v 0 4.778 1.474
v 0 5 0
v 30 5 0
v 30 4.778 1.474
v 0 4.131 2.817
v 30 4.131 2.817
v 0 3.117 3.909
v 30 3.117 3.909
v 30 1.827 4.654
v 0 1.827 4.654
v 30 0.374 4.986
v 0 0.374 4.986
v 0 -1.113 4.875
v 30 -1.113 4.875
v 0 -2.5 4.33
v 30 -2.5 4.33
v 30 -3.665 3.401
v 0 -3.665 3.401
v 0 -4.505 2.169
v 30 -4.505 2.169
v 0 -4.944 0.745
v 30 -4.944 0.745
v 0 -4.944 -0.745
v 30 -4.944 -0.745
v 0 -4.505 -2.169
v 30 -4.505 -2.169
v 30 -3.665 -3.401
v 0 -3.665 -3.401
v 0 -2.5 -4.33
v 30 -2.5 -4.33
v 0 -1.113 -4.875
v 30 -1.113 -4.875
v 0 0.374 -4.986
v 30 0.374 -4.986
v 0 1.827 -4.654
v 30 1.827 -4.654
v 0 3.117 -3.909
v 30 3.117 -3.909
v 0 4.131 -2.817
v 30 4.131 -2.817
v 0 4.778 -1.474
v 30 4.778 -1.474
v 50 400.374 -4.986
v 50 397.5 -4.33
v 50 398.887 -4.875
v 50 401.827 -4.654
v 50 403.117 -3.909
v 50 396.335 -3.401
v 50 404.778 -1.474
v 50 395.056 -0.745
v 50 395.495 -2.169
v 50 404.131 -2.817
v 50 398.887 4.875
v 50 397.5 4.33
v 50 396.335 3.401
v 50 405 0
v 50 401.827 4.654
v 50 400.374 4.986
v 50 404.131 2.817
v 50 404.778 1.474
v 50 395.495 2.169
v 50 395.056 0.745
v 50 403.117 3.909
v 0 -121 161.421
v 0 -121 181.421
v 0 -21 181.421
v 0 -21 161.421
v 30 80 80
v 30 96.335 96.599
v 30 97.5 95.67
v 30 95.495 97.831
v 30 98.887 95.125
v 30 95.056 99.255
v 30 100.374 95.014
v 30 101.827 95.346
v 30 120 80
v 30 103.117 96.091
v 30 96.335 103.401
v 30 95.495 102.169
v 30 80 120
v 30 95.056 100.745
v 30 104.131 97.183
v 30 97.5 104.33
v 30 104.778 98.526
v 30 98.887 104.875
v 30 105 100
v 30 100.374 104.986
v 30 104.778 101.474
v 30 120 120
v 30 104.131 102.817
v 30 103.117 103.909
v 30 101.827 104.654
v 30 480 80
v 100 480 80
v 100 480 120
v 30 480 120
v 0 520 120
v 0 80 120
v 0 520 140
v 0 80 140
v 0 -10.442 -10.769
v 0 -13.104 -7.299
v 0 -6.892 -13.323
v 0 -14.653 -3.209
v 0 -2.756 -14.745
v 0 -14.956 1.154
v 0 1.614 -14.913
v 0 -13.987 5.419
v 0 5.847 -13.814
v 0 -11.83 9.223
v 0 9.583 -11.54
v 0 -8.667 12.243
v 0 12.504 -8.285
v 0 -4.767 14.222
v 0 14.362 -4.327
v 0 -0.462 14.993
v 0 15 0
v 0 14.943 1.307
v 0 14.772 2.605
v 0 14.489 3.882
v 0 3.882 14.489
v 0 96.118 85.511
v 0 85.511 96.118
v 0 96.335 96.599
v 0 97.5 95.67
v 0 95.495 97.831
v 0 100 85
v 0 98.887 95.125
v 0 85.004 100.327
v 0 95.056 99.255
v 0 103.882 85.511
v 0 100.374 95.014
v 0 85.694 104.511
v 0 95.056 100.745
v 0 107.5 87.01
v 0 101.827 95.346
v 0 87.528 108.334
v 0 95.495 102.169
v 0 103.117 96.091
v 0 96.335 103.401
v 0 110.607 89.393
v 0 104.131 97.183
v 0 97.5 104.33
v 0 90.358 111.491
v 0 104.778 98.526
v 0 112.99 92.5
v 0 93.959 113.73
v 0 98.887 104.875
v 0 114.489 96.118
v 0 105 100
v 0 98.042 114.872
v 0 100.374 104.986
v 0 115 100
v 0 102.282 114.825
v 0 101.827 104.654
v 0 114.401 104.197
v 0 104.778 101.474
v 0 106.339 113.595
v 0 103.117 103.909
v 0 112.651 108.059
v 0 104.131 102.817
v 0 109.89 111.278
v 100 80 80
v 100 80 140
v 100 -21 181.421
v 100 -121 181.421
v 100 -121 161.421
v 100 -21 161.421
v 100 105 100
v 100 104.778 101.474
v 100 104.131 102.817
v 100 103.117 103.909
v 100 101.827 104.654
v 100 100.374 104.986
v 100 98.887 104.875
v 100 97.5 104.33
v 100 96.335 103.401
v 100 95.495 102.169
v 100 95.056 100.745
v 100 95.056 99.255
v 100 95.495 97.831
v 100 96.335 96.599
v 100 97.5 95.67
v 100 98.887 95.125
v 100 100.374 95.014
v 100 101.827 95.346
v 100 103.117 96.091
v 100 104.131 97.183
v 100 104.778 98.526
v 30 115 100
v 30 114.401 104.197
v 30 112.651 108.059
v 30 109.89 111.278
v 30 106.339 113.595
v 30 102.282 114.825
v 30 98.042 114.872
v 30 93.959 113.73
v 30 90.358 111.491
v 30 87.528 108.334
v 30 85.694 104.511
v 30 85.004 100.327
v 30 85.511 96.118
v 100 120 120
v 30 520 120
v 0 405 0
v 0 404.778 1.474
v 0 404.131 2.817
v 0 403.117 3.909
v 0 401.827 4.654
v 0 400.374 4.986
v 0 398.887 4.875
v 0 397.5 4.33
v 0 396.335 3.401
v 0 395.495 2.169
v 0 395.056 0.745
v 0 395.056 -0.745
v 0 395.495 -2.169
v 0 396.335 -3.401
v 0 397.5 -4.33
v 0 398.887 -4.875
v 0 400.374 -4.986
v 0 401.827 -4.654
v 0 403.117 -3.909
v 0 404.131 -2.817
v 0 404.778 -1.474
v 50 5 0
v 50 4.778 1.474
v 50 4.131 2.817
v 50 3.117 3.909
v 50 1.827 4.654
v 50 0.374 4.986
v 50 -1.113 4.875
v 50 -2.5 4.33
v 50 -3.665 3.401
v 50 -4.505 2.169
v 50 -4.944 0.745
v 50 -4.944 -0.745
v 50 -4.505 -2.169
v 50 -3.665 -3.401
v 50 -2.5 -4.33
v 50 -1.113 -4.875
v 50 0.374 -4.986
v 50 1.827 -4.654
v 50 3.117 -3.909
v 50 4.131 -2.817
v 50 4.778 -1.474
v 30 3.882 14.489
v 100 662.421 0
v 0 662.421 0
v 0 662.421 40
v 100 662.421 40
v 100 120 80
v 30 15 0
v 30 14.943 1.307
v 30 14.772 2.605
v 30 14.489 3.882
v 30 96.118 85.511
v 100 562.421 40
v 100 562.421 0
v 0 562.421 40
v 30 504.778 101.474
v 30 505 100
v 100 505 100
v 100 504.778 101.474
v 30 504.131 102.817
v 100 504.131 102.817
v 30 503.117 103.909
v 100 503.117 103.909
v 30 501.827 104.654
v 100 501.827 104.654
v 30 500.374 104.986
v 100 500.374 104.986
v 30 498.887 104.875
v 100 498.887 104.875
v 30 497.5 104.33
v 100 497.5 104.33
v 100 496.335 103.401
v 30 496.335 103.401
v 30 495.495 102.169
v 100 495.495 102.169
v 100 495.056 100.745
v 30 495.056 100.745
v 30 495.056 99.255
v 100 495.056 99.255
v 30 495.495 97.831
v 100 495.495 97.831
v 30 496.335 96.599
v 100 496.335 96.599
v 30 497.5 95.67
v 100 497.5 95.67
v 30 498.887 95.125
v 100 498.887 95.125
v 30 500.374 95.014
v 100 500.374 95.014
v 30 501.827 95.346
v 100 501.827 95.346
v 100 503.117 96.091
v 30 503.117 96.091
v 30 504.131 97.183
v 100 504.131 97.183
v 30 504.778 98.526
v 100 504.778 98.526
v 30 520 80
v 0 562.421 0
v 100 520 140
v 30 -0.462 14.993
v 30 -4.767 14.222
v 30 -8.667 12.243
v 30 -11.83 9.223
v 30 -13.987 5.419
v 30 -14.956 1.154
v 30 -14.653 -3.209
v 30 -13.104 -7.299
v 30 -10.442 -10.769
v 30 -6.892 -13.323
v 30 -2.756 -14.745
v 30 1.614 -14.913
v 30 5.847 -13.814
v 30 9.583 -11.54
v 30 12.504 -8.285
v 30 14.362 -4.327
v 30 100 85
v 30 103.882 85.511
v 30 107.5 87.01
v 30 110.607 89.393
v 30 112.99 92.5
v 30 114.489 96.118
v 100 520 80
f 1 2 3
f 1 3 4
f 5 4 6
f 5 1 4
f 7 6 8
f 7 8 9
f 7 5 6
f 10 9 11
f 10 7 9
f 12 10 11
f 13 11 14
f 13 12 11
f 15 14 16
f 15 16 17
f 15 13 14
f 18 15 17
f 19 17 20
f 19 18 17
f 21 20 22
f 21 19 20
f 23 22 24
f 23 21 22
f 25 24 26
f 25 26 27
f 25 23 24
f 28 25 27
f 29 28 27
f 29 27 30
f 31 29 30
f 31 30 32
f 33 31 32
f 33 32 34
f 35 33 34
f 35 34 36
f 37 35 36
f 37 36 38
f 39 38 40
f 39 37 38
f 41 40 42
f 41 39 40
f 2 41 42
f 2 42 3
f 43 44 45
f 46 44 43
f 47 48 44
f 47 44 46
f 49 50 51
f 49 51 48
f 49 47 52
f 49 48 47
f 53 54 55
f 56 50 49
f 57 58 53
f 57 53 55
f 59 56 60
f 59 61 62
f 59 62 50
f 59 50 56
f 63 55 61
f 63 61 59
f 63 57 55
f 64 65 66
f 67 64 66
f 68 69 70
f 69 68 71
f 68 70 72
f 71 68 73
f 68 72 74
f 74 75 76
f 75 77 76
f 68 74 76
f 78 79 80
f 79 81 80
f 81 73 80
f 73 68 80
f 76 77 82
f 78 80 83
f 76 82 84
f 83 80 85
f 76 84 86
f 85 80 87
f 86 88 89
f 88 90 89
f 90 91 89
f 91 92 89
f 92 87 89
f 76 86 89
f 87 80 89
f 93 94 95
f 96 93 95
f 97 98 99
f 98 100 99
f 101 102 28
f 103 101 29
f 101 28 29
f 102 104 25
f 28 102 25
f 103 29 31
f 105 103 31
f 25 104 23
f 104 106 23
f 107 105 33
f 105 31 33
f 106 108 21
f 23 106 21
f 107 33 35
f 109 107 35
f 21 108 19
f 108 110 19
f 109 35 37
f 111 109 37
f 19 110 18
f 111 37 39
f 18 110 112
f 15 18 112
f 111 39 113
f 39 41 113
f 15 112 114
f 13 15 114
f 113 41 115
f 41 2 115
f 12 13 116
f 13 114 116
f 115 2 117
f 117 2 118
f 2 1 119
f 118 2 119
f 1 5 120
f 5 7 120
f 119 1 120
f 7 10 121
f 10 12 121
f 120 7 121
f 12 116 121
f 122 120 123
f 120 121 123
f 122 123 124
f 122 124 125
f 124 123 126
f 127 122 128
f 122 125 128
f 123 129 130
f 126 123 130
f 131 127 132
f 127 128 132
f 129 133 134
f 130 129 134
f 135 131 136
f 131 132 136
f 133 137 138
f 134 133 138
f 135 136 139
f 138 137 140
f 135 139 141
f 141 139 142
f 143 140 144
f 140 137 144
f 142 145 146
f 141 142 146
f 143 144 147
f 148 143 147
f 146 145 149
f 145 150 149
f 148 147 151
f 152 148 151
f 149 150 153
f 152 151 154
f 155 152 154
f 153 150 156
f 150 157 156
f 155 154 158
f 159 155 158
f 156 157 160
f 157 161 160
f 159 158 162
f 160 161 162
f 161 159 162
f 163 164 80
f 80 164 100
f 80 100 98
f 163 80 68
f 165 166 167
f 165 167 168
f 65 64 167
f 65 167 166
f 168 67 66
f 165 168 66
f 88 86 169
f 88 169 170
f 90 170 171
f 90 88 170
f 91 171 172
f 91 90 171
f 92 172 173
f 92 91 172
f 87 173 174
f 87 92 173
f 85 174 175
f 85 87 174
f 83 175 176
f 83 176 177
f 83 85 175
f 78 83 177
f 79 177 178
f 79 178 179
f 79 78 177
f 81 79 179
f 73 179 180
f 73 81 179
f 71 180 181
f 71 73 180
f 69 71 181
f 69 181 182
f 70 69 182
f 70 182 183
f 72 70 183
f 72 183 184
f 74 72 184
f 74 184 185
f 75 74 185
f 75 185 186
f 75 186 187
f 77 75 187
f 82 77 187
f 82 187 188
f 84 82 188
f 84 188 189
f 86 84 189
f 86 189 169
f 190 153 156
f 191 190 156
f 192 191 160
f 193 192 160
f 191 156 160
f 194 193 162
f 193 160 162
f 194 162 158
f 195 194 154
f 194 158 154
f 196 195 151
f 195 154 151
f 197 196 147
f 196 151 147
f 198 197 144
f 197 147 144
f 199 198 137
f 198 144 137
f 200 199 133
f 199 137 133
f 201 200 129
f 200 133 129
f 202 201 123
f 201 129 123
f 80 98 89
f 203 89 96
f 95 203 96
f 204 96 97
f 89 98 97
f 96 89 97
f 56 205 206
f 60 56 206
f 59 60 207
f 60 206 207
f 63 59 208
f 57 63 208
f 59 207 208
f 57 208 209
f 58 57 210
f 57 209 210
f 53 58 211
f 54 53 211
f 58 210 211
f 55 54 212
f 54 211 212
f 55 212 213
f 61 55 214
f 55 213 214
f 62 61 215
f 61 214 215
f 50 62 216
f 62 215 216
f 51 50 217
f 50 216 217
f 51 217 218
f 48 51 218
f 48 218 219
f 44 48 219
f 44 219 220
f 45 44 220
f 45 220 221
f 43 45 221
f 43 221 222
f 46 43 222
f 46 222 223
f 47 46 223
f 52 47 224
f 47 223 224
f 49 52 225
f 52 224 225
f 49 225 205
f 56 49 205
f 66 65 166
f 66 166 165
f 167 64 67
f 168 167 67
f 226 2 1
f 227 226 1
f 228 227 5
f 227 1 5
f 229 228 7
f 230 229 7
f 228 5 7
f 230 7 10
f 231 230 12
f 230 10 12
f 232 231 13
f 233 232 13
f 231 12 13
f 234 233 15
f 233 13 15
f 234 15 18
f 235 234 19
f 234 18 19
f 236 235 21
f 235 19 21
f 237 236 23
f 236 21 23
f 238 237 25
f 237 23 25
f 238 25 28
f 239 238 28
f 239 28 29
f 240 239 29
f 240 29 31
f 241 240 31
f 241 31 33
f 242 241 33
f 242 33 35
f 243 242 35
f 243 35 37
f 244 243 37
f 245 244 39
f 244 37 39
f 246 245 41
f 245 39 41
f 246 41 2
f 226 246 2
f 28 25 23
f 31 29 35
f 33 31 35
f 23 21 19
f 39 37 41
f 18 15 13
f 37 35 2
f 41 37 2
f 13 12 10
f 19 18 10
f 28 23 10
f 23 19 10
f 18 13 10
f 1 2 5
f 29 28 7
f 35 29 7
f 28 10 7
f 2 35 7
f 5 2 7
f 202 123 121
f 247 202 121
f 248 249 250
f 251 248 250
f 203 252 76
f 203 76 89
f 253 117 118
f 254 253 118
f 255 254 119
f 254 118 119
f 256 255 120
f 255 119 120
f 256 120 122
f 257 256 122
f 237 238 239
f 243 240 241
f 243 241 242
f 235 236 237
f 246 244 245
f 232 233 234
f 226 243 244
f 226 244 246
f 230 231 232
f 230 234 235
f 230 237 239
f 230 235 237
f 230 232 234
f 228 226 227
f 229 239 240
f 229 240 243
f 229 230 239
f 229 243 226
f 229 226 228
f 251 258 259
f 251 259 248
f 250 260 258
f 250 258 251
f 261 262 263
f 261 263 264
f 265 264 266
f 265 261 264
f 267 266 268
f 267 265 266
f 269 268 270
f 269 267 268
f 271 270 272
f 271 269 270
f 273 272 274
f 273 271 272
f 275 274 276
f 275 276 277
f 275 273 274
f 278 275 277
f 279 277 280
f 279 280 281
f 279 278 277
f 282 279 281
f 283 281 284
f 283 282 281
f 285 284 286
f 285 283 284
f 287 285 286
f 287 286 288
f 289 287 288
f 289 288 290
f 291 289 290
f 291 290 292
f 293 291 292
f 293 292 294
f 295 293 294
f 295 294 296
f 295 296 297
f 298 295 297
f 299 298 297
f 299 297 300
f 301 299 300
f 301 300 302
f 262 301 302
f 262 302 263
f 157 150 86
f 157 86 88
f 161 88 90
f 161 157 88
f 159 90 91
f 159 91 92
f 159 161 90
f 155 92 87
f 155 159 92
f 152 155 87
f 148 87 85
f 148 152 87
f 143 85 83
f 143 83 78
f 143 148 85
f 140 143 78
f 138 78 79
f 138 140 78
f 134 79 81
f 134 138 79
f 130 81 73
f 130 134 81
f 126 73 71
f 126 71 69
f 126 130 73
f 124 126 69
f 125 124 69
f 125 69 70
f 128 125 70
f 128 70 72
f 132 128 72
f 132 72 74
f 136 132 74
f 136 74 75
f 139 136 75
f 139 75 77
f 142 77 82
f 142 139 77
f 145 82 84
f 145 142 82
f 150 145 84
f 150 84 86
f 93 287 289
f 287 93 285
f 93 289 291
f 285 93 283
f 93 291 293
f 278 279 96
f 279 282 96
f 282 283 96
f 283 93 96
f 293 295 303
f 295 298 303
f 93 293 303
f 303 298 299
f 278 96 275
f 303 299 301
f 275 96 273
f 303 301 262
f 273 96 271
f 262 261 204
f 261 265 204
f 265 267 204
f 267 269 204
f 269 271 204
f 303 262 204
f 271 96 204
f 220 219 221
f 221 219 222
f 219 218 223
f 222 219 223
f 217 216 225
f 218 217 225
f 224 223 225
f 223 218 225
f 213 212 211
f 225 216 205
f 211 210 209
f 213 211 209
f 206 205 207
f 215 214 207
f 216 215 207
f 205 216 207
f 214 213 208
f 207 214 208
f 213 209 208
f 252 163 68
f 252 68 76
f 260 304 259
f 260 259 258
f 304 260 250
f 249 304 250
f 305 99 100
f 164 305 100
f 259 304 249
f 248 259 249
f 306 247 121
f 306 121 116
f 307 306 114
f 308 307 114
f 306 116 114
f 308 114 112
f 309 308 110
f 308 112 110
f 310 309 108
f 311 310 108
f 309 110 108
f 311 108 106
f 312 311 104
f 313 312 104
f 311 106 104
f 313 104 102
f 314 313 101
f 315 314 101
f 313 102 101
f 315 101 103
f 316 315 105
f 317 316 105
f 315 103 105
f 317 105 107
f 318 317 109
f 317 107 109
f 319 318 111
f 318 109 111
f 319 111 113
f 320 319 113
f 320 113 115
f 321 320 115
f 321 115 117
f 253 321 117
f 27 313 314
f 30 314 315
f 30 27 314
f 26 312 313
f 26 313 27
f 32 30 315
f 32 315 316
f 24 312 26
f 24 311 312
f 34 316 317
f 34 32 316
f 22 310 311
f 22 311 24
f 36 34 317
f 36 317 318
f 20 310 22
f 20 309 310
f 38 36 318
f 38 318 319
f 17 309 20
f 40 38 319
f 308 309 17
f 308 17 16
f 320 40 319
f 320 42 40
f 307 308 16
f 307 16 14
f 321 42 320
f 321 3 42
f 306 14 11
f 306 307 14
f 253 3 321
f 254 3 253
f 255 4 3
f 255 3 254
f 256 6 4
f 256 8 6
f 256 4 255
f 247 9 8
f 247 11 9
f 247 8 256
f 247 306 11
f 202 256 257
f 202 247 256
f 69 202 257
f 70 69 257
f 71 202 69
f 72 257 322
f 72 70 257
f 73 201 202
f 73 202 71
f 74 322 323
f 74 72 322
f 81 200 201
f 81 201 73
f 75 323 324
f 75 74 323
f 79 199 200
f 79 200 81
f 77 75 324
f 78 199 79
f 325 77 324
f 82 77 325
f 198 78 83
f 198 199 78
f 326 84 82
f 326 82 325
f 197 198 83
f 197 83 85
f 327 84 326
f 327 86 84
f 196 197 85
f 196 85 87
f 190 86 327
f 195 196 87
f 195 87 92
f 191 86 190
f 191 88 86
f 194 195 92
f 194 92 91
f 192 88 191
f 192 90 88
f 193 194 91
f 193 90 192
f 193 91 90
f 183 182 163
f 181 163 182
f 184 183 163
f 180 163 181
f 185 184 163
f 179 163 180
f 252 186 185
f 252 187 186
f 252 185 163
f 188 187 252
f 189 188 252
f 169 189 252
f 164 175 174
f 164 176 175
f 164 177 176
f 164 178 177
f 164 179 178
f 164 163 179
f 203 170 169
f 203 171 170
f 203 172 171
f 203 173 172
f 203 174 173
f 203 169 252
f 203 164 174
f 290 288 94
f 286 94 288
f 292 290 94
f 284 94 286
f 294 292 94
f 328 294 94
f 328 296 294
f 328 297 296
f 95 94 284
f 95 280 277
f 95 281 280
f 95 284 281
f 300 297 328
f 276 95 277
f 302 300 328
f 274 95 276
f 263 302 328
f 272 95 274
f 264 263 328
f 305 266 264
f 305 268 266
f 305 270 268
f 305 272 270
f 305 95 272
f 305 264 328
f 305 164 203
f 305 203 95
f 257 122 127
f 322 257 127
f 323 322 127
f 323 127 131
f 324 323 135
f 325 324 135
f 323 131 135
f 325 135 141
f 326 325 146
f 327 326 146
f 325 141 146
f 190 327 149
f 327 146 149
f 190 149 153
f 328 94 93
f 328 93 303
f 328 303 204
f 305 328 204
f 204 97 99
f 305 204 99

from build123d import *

# Parameters (mm, degrees)
F0_R     = 5
F0_W     = 40
F0_H     = 40
F1_DEPTH = 100
F2_DEPTH = 30
F3_DEPTH = 30
F0_W_2   = 100
F4_DEPTH = 100
F0_H_2   = 20
F5_DEPTH = 100
F6_DEPTH = 50


with BuildPart() as f1:
    # F0 (on Right) → F1 (new body)
    with BuildSketch(Plane.YZ):
        with BuildLine():
            Line((90.6066017178, 80), (120, 80))
            Line((120, 80), (120, 120))
            Line((120, 120), (80, 120))
            Line((80, 120), (80, 90.6066017178))
            Line((80, 90.6066017178), (85.5111126057, 96.1177143235))
            ThreePointArc((85.5111126057, 96.1177143235), (98.0421071167, 114.8716729206), (115, 100))
            ThreePointArc((115, 100), (109.1314214351, 88.0996998956), (96.1177143235, 85.5111126057))
            Line((96.1177143235, 85.5111126057), (90.6066017178, 80))
        make_face()
        with BuildLine():
            Line((80, 80), (90.6066017178, 80))
            Line((90.6066017178, 80), (96.1177143235, 85.5111126057))
            ThreePointArc((96.1177143235, 85.5111126057), (89.3933982822, 89.3933982822), (85.5111126057, 96.1177143235))
            Line((85.5111126057, 96.1177143235), (80, 90.6066017178))
            Line((80, 90.6066017178), (80, 80))
        make_face()
        with BuildLine():
            ThreePointArc((85.5111126057, 96.1177143235), (89.3933982822, 89.3933982822), (96.1177143235, 85.5111126057))
            ThreePointArc((96.1177143235, 85.5111126057), (109.1314214351, 88.0996998956), (115, 100))
            ThreePointArc((115, 100), (98.0421071167, 114.8716729206), (85.5111126057, 96.1177143235))
        make_face()
        with Locations((100, 100)):
            Circle(F0_R, mode=Mode.SUBTRACT)
        Polygon((80, 120), (120, 120), (480, 120), (520, 120), (520, 140), (80, 140), align=None)
        with Locations((500, 100)):
            Rectangle(F0_W, F0_H)
        with Locations((500, 100)):
            Circle(F0_R, mode=Mode.SUBTRACT)
    extrude(amount=F1_DEPTH)

    # F0 (on Right) → F3 (cut)
    with BuildSketch(Plane.YZ):
        with BuildLine():
            Line((90.6066017178, 80), (120, 80))
            Line((120, 80), (120, 120))
            Line((120, 120), (80, 120))
            Line((80, 120), (80, 90.6066017178))
            Line((80, 90.6066017178), (85.5111126057, 96.1177143235))
            ThreePointArc((85.5111126057, 96.1177143235), (98.0421071167, 114.8716729206), (115, 100))
            ThreePointArc((115, 100), (109.1314214351, 88.0996998956), (96.1177143235, 85.5111126057))
            Line((96.1177143235, 85.5111126057), (90.6066017178, 80))
        make_face()
        with BuildLine():
            ThreePointArc((85.5111126057, 96.1177143235), (89.3933982822, 89.3933982822), (96.1177143235, 85.5111126057))
            ThreePointArc((96.1177143235, 85.5111126057), (109.1314214351, 88.0996998956), (115, 100))
            ThreePointArc((115, 100), (98.0421071167, 114.8716729206), (85.5111126057, 96.1177143235))
        make_face()
        with Locations((100, 100)):
            Circle(F0_R, mode=Mode.SUBTRACT)
        with BuildLine():
            Line((80, 80), (90.6066017178, 80))
            Line((90.6066017178, 80), (96.1177143235, 85.5111126057))
            ThreePointArc((96.1177143235, 85.5111126057), (89.3933982822, 89.3933982822), (85.5111126057, 96.1177143235))
            Line((85.5111126057, 96.1177143235), (80, 90.6066017178))
            Line((80, 90.6066017178), (80, 80))
        make_face()
        with Locations((500, 100)):
            Rectangle(F0_W, F0_H)
        with Locations((500, 100)):
            Circle(F0_R, mode=Mode.SUBTRACT)
    extrude(amount=F3_DEPTH, mode=Mode.SUBTRACT)


with BuildPart() as f2:
    # F0 (on Right) → F2 (new body)
    with BuildSketch(Plane.YZ):
        with BuildLine():
            ThreePointArc((85.5111126057, 96.1177143235), (89.3933982822, 89.3933982822), (96.1177143235, 85.5111126057))
            ThreePointArc((96.1177143235, 85.5111126057), (109.1314214351, 88.0996998956), (115, 100))
            ThreePointArc((115, 100), (98.0421071167, 114.8716729206), (85.5111126057, 96.1177143235))
        make_face()
        with Locations((100, 100)):
            Circle(F0_R, mode=Mode.SUBTRACT)
        with BuildLine():
            Line((80, 80), (90.6066017178, 80))
            Line((90.6066017178, 80), (96.1177143235, 85.5111126057))
            ThreePointArc((96.1177143235, 85.5111126057), (89.3933982822, 89.3933982822), (85.5111126057, 96.1177143235))
            Line((85.5111126057, 96.1177143235), (80, 90.6066017178))
            Line((80, 90.6066017178), (80, 80))
        make_face()
        with BuildLine():
            Line((14.4888873943, 3.8822856765), (90.6066017178, 80))
            Line((90.6066017178, 80), (80, 80))
            Line((80, 80), (80, 90.6066017178))
            Line((80, 90.6066017178), (3.8822856765, 14.4888873943))
            ThreePointArc((3.8822856765, 14.4888873943), (10.6066017178, 10.6066017178), (14.4888873943, 3.8822856765))
        make_face()
        with BuildLine():
            ThreePointArc((15, 0), (14.8716729206, 1.9578928833), (14.4888873943, 3.8822856765))
            ThreePointArc((14.4888873943, 3.8822856765), (10.6066017178, 10.6066017178), (3.8822856765, 14.4888873943))
            ThreePointArc((3.8822856765, 14.4888873943), (-11.9003001044, -9.1314214351), (15, 0))
        make_face()
        Circle(F0_R, mode=Mode.SUBTRACT)
    extrude(amount=F2_DEPTH)


with BuildPart() as f4:
    # F0 (on Right) → F4 (new body)
    with BuildSketch(Plane.YZ):
        with Locations((612.4213562373, 20)):
            Rectangle(F0_W_2, F0_H)
    extrude(amount=F4_DEPTH)


with BuildPart() as f5:
    # F0 (on Right) → F5 (new body)
    with BuildSketch(Plane.YZ):
        with Locations((-71, 171.4213562373)):
            Rectangle(F0_W_2, F0_H_2)
    extrude(amount=F5_DEPTH)


with BuildPart() as f6:
    # F0 (on Right) → F6 (new body)
    with BuildSketch(Plane.YZ):
        Circle(F0_R)
    extrude(amount=F6_DEPTH)


with BuildPart() as f6b:
    # F0 (on Right) → F6, piece 2 (new body)
    with BuildSketch(Plane.YZ):
        with Locations((400, 0)):
            Circle(F0_R)
    extrude(amount=F6_DEPTH)


solid = Compound([f1.part, f2.part, f4.part, f5.part, f6.part, f6b.part])
